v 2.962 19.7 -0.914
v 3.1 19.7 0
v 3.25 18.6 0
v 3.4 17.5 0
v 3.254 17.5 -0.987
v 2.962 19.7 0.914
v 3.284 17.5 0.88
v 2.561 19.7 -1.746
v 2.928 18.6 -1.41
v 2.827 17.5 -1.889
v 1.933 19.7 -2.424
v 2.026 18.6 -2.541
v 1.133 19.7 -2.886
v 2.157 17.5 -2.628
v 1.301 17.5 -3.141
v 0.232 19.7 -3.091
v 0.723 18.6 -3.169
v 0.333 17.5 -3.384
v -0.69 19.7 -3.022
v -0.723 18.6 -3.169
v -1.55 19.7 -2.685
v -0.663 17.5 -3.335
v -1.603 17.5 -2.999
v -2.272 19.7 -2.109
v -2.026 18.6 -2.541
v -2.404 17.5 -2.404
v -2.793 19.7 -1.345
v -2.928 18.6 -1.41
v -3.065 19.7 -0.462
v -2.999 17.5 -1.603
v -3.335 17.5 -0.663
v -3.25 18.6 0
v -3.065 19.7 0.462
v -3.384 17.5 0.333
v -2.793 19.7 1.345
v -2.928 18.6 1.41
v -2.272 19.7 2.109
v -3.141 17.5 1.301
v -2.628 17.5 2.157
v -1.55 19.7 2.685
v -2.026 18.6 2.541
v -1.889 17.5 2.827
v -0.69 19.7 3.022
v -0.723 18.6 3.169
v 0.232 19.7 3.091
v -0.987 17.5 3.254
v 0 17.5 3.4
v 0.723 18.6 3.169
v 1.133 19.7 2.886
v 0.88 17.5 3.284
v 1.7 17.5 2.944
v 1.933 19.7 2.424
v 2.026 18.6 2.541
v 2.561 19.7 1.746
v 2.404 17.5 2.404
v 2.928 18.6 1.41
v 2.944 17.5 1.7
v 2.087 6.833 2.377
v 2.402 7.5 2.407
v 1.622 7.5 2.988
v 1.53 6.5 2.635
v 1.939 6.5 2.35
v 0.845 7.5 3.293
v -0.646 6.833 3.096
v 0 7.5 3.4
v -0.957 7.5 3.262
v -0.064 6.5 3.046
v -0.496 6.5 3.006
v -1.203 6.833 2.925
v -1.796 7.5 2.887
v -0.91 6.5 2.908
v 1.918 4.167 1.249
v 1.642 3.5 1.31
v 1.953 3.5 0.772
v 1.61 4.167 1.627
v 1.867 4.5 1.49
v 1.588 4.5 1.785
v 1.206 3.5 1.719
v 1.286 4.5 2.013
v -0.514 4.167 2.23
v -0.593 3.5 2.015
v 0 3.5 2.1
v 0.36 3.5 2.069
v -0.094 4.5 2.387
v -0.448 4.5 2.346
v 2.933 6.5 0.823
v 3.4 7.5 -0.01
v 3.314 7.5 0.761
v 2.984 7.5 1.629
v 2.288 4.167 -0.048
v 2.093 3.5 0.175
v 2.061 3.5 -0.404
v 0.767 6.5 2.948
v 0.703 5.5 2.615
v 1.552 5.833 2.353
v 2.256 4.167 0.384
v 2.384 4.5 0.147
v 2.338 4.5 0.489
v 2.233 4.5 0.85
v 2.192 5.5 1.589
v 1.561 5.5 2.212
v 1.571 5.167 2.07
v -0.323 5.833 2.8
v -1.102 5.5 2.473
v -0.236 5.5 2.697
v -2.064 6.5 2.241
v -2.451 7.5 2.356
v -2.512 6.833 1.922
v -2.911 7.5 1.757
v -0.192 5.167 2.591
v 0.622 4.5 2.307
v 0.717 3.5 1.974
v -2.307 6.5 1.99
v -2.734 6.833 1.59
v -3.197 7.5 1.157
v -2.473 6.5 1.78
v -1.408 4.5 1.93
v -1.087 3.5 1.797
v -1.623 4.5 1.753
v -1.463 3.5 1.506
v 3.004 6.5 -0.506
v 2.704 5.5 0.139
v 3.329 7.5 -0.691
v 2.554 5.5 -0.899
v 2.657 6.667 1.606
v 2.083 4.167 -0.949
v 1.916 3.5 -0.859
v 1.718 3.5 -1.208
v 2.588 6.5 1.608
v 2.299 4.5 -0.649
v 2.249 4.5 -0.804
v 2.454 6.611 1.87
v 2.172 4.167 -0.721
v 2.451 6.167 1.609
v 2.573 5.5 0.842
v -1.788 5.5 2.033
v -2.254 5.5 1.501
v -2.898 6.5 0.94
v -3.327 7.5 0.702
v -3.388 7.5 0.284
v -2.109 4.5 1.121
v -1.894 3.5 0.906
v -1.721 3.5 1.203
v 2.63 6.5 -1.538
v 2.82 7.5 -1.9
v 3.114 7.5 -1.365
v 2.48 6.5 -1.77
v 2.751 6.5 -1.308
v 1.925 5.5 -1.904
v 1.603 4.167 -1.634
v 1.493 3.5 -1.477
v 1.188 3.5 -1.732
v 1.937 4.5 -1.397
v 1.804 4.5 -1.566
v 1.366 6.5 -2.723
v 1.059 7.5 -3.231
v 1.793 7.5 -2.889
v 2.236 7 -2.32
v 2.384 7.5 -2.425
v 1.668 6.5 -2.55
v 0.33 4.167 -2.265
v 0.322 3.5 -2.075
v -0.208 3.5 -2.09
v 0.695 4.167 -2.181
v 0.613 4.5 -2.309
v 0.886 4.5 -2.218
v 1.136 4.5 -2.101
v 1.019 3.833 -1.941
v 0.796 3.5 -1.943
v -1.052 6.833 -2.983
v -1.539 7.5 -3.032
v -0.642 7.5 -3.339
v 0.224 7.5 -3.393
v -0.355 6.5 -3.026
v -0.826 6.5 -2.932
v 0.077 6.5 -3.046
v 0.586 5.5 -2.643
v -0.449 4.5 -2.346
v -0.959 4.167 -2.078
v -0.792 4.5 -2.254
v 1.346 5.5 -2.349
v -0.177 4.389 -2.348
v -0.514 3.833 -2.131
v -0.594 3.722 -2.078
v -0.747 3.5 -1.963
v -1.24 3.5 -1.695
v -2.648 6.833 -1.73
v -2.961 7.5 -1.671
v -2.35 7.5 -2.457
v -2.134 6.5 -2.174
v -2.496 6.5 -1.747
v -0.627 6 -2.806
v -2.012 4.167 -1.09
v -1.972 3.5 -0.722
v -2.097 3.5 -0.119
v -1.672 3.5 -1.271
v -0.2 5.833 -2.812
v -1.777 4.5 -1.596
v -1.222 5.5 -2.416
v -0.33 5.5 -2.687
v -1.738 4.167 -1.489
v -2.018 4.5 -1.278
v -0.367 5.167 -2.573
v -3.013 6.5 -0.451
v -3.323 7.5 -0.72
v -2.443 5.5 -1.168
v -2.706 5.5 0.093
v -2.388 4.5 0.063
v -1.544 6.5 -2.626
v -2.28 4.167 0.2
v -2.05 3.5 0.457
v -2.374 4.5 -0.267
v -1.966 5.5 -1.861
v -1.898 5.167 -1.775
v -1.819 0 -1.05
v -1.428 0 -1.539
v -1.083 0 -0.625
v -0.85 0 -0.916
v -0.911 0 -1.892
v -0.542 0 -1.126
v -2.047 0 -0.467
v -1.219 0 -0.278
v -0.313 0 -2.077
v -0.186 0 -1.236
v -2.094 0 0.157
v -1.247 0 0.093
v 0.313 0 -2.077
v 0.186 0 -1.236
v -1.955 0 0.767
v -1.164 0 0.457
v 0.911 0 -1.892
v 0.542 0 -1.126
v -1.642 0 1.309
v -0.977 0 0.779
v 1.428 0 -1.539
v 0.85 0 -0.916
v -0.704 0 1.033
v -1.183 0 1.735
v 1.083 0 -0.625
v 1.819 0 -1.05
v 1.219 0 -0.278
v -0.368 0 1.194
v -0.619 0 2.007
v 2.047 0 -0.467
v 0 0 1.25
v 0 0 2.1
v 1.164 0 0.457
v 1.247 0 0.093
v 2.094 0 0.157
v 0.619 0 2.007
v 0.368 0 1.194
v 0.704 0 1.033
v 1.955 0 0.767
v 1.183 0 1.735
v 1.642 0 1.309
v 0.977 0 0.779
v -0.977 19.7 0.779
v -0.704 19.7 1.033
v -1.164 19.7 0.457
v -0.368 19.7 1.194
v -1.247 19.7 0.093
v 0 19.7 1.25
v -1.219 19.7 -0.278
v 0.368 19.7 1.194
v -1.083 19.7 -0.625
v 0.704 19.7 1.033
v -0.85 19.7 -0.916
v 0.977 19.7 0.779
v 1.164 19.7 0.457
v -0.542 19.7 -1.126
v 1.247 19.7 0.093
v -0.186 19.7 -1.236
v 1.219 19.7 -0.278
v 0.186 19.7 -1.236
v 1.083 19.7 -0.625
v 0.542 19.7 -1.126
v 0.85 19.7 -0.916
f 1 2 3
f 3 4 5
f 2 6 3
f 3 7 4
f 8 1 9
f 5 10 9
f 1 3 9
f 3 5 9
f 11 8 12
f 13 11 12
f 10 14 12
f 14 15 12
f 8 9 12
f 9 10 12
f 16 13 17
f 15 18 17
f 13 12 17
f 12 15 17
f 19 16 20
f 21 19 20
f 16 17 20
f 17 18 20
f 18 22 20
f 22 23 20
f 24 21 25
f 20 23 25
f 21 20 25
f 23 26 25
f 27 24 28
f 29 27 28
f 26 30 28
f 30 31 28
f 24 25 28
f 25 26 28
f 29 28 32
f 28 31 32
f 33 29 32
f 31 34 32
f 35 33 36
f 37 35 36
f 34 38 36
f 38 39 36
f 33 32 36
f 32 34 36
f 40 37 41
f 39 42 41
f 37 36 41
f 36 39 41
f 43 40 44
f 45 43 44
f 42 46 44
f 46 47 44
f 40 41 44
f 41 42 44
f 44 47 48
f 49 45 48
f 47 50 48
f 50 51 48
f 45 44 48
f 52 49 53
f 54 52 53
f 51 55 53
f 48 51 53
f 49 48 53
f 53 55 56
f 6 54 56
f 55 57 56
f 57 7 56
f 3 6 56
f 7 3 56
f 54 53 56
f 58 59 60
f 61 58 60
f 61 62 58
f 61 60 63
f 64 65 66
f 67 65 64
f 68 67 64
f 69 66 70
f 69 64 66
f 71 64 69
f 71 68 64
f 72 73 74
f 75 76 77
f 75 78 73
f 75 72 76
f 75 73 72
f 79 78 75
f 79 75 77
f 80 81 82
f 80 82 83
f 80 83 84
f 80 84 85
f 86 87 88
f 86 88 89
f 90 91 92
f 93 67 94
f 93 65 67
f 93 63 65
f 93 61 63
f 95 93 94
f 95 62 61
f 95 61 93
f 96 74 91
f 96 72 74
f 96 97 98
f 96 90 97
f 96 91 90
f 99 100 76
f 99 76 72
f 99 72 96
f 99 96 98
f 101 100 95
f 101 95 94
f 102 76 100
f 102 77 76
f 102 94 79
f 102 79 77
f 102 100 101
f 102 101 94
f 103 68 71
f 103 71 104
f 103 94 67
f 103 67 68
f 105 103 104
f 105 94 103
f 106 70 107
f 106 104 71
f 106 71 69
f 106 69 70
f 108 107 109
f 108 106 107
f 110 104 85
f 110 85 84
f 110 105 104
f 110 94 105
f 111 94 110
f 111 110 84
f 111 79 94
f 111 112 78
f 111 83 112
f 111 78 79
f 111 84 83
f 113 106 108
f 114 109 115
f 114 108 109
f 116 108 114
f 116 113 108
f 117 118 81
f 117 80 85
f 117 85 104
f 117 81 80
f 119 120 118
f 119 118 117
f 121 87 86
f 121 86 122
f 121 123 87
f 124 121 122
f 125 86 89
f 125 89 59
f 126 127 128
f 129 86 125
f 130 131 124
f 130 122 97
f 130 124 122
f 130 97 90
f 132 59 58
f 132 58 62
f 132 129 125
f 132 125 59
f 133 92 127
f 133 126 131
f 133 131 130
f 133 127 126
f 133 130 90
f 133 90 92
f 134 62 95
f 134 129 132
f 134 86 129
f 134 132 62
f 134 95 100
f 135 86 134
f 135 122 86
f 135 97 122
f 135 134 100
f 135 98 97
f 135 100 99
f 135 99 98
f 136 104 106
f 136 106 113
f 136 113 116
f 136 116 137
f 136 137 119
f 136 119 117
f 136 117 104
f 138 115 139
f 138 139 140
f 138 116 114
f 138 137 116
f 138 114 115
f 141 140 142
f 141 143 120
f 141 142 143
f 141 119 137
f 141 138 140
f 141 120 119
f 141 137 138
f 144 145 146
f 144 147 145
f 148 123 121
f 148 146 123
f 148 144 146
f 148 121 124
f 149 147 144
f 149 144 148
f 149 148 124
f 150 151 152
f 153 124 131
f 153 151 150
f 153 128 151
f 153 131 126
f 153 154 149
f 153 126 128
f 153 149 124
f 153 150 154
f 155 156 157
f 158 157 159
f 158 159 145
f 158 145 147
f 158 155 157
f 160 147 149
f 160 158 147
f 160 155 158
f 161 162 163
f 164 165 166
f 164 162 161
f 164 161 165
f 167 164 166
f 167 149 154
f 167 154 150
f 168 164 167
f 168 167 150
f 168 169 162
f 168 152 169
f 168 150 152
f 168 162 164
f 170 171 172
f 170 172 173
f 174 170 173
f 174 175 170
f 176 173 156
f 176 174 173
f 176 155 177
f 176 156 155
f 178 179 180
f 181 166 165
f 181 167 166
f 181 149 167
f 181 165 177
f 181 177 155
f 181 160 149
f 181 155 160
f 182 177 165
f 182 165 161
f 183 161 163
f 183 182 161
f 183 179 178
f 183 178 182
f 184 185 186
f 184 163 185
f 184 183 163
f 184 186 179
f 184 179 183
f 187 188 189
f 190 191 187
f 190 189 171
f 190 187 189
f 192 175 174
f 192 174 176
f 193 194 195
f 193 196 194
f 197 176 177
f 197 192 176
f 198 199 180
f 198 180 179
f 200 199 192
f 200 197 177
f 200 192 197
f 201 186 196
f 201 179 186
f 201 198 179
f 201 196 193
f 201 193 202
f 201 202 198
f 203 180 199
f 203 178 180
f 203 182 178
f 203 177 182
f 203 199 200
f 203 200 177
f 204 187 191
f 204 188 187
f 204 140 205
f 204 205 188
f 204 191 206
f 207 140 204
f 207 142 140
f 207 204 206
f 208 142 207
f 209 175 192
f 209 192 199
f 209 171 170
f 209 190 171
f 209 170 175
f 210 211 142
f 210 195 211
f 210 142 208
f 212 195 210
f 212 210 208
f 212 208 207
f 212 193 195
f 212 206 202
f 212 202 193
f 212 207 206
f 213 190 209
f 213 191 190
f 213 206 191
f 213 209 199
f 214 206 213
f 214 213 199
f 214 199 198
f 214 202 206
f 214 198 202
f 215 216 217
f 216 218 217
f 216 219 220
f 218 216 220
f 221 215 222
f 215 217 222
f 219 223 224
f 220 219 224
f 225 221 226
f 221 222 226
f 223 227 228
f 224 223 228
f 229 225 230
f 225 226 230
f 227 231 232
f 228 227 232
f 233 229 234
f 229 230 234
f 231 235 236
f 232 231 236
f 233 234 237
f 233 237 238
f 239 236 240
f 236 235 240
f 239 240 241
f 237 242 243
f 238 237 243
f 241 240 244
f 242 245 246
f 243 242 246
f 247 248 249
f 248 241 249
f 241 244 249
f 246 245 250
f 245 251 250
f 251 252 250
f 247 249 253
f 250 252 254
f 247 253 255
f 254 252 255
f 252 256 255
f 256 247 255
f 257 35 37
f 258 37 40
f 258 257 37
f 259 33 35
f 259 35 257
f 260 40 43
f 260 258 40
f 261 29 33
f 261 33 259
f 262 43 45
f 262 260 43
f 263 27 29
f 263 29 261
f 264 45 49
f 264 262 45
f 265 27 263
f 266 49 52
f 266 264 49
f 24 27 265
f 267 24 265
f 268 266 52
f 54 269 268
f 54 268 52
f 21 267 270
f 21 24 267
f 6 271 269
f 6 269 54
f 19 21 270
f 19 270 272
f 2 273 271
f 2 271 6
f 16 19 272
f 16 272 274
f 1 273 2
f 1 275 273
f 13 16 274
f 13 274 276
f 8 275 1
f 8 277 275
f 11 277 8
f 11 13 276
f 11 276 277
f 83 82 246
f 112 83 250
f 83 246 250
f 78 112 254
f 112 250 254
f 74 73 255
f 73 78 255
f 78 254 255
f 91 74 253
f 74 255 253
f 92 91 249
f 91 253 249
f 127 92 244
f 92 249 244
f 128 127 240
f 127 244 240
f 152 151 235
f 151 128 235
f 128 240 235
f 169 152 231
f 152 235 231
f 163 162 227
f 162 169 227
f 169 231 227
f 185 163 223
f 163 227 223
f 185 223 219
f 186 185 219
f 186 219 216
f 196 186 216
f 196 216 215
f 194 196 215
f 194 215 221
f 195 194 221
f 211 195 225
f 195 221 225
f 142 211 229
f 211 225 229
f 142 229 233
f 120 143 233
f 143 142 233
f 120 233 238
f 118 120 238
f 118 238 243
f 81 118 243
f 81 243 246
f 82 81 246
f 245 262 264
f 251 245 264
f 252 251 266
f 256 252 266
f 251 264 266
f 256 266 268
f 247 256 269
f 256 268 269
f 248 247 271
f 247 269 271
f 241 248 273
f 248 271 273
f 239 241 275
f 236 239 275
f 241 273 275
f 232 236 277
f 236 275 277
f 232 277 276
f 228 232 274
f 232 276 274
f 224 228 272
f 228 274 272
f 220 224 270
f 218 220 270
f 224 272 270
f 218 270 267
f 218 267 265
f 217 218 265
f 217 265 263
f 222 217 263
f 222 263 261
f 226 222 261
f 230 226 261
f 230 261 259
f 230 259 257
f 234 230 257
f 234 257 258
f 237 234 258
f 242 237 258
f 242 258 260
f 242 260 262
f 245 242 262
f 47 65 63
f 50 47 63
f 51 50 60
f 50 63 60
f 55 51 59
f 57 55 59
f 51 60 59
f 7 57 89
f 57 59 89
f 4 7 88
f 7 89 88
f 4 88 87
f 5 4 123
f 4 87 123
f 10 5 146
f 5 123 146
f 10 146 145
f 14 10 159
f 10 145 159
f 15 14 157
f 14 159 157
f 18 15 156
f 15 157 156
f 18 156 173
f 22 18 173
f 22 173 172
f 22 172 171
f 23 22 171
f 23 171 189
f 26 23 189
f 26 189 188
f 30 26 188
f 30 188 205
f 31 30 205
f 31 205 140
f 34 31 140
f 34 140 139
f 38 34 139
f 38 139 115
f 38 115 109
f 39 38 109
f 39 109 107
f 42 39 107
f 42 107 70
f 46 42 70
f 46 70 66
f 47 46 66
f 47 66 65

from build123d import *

# Parameters (mm, degrees)
SKETCH_1_R          = 2.1
EXTRUDE_1_DEPTH     = 7.5
SKETCH_5_R          = 3.4
EXTRUDE_2_DEPTH     = 10
SKETCH_7_R          = 3.1
SKETCH_6_R          = 3.4
SKETCH_8_R          = 1.25
CUT_EXTRUDE_1_DEPTH = 21.27831367


with BuildPart() as part:
    # 草图1 → 凸台-拉伸1 (new body)
    with BuildSketch(Plane(origin=(0, 0, 0), x_dir=(1, 0, 0), z_dir=(0, 1, 0))):
        with Locations(Location((0, 0, 0), (0, 0, 270))):
            Circle(SKETCH_1_R)
    extrude(amount=EXTRUDE_1_DEPTH)

    # 放样1: read off the stored shape, not the designer's step
    # 放样1: loft between two sections, ruled curve by curve
    loft_1_from = [
        Edge.make_bspline([(-3.388135234, 7.5, 0.283795064), (-3.955725362, 7.5, -6.492475403), (2.820545105, 7.5, -7.060065531), (3.388135234, 7.5, -0.283795064), (3.955725362, 7.5, 6.492475403), (-2.820545105, 7.5, 7.060065531), (-3.388135234, 7.5, 0.283795064)], [0, 0, 0, 0, 0.5, 0.5, 0.5, 1, 1, 1, 1], 3, [1, 0.333333333, 0.333333333, 1, 0.333333333, 0.333333333, 1]),
    ]
    loft_1_to = [
        Edge.make_bspline([(-1.894481315, 3.5, 0.906057696), (-3.706596707, 3.5, -2.882904933), (0.082365923, 3.5, -4.695020325), (1.894481315, 3.5, -0.906057696), (3.706596707, 3.5, 2.882904933), (-0.082365923, 3.5, 4.695020325), (-1.894481315, 3.5, 0.906057696)], [0, 0, 0, 0, 0.5, 0.5, 0.5, 1, 1, 1, 1], 3, [1, 0.333333333, 0.333333333, 1, 0.333333333, 0.333333333, 1]),
    ]
    loft_1 = Solid(Shell([*[Face.make_surface_from_curves(loft_1_from[k], loft_1_to[k]) for k in range(1)], Face(Wire(loft_1_from)), Face(Wire(loft_1_to))]))
    add(loft_1)

    # 草图5 → 凸台-拉伸2 (add)
    with BuildSketch(Plane(origin=(0, 7.5, 0), x_dir=(1, 0, 0), z_dir=(0, 1, 0))):
        with Locations(Location((0, 0, 0), (0, 0, 270))):
            Circle(SKETCH_5_R)
    extrude(amount=EXTRUDE_2_DEPTH)

    # 草图7 → 放样2 section 0
    with BuildSketch(Plane(origin=(0, 19.7, 0), x_dir=(1, 0, 0), z_dir=(0, 1, 0))):
        Circle(SKETCH_7_R)
    # 草图6 → 放样2 section 1
    with BuildSketch(Plane(origin=(0, 17.5, 0), x_dir=(1, 0, 0), z_dir=(0, 1, 0))):
        Circle(SKETCH_6_R)
    loft()

    # 草图8 → 切除-拉伸1 (cut, through all)
    with BuildSketch(Plane(origin=(0, 19.7, 0), x_dir=(1, 0, 0), z_dir=(0, 1, 0))):
        with Locations(Location((0, 0, 0), (0, 0, 270))):
            Circle(SKETCH_8_R)
    extrude(amount=-CUT_EXTRUDE_1_DEPTH, mode=Mode.SUBTRACT)


solid = part.part
